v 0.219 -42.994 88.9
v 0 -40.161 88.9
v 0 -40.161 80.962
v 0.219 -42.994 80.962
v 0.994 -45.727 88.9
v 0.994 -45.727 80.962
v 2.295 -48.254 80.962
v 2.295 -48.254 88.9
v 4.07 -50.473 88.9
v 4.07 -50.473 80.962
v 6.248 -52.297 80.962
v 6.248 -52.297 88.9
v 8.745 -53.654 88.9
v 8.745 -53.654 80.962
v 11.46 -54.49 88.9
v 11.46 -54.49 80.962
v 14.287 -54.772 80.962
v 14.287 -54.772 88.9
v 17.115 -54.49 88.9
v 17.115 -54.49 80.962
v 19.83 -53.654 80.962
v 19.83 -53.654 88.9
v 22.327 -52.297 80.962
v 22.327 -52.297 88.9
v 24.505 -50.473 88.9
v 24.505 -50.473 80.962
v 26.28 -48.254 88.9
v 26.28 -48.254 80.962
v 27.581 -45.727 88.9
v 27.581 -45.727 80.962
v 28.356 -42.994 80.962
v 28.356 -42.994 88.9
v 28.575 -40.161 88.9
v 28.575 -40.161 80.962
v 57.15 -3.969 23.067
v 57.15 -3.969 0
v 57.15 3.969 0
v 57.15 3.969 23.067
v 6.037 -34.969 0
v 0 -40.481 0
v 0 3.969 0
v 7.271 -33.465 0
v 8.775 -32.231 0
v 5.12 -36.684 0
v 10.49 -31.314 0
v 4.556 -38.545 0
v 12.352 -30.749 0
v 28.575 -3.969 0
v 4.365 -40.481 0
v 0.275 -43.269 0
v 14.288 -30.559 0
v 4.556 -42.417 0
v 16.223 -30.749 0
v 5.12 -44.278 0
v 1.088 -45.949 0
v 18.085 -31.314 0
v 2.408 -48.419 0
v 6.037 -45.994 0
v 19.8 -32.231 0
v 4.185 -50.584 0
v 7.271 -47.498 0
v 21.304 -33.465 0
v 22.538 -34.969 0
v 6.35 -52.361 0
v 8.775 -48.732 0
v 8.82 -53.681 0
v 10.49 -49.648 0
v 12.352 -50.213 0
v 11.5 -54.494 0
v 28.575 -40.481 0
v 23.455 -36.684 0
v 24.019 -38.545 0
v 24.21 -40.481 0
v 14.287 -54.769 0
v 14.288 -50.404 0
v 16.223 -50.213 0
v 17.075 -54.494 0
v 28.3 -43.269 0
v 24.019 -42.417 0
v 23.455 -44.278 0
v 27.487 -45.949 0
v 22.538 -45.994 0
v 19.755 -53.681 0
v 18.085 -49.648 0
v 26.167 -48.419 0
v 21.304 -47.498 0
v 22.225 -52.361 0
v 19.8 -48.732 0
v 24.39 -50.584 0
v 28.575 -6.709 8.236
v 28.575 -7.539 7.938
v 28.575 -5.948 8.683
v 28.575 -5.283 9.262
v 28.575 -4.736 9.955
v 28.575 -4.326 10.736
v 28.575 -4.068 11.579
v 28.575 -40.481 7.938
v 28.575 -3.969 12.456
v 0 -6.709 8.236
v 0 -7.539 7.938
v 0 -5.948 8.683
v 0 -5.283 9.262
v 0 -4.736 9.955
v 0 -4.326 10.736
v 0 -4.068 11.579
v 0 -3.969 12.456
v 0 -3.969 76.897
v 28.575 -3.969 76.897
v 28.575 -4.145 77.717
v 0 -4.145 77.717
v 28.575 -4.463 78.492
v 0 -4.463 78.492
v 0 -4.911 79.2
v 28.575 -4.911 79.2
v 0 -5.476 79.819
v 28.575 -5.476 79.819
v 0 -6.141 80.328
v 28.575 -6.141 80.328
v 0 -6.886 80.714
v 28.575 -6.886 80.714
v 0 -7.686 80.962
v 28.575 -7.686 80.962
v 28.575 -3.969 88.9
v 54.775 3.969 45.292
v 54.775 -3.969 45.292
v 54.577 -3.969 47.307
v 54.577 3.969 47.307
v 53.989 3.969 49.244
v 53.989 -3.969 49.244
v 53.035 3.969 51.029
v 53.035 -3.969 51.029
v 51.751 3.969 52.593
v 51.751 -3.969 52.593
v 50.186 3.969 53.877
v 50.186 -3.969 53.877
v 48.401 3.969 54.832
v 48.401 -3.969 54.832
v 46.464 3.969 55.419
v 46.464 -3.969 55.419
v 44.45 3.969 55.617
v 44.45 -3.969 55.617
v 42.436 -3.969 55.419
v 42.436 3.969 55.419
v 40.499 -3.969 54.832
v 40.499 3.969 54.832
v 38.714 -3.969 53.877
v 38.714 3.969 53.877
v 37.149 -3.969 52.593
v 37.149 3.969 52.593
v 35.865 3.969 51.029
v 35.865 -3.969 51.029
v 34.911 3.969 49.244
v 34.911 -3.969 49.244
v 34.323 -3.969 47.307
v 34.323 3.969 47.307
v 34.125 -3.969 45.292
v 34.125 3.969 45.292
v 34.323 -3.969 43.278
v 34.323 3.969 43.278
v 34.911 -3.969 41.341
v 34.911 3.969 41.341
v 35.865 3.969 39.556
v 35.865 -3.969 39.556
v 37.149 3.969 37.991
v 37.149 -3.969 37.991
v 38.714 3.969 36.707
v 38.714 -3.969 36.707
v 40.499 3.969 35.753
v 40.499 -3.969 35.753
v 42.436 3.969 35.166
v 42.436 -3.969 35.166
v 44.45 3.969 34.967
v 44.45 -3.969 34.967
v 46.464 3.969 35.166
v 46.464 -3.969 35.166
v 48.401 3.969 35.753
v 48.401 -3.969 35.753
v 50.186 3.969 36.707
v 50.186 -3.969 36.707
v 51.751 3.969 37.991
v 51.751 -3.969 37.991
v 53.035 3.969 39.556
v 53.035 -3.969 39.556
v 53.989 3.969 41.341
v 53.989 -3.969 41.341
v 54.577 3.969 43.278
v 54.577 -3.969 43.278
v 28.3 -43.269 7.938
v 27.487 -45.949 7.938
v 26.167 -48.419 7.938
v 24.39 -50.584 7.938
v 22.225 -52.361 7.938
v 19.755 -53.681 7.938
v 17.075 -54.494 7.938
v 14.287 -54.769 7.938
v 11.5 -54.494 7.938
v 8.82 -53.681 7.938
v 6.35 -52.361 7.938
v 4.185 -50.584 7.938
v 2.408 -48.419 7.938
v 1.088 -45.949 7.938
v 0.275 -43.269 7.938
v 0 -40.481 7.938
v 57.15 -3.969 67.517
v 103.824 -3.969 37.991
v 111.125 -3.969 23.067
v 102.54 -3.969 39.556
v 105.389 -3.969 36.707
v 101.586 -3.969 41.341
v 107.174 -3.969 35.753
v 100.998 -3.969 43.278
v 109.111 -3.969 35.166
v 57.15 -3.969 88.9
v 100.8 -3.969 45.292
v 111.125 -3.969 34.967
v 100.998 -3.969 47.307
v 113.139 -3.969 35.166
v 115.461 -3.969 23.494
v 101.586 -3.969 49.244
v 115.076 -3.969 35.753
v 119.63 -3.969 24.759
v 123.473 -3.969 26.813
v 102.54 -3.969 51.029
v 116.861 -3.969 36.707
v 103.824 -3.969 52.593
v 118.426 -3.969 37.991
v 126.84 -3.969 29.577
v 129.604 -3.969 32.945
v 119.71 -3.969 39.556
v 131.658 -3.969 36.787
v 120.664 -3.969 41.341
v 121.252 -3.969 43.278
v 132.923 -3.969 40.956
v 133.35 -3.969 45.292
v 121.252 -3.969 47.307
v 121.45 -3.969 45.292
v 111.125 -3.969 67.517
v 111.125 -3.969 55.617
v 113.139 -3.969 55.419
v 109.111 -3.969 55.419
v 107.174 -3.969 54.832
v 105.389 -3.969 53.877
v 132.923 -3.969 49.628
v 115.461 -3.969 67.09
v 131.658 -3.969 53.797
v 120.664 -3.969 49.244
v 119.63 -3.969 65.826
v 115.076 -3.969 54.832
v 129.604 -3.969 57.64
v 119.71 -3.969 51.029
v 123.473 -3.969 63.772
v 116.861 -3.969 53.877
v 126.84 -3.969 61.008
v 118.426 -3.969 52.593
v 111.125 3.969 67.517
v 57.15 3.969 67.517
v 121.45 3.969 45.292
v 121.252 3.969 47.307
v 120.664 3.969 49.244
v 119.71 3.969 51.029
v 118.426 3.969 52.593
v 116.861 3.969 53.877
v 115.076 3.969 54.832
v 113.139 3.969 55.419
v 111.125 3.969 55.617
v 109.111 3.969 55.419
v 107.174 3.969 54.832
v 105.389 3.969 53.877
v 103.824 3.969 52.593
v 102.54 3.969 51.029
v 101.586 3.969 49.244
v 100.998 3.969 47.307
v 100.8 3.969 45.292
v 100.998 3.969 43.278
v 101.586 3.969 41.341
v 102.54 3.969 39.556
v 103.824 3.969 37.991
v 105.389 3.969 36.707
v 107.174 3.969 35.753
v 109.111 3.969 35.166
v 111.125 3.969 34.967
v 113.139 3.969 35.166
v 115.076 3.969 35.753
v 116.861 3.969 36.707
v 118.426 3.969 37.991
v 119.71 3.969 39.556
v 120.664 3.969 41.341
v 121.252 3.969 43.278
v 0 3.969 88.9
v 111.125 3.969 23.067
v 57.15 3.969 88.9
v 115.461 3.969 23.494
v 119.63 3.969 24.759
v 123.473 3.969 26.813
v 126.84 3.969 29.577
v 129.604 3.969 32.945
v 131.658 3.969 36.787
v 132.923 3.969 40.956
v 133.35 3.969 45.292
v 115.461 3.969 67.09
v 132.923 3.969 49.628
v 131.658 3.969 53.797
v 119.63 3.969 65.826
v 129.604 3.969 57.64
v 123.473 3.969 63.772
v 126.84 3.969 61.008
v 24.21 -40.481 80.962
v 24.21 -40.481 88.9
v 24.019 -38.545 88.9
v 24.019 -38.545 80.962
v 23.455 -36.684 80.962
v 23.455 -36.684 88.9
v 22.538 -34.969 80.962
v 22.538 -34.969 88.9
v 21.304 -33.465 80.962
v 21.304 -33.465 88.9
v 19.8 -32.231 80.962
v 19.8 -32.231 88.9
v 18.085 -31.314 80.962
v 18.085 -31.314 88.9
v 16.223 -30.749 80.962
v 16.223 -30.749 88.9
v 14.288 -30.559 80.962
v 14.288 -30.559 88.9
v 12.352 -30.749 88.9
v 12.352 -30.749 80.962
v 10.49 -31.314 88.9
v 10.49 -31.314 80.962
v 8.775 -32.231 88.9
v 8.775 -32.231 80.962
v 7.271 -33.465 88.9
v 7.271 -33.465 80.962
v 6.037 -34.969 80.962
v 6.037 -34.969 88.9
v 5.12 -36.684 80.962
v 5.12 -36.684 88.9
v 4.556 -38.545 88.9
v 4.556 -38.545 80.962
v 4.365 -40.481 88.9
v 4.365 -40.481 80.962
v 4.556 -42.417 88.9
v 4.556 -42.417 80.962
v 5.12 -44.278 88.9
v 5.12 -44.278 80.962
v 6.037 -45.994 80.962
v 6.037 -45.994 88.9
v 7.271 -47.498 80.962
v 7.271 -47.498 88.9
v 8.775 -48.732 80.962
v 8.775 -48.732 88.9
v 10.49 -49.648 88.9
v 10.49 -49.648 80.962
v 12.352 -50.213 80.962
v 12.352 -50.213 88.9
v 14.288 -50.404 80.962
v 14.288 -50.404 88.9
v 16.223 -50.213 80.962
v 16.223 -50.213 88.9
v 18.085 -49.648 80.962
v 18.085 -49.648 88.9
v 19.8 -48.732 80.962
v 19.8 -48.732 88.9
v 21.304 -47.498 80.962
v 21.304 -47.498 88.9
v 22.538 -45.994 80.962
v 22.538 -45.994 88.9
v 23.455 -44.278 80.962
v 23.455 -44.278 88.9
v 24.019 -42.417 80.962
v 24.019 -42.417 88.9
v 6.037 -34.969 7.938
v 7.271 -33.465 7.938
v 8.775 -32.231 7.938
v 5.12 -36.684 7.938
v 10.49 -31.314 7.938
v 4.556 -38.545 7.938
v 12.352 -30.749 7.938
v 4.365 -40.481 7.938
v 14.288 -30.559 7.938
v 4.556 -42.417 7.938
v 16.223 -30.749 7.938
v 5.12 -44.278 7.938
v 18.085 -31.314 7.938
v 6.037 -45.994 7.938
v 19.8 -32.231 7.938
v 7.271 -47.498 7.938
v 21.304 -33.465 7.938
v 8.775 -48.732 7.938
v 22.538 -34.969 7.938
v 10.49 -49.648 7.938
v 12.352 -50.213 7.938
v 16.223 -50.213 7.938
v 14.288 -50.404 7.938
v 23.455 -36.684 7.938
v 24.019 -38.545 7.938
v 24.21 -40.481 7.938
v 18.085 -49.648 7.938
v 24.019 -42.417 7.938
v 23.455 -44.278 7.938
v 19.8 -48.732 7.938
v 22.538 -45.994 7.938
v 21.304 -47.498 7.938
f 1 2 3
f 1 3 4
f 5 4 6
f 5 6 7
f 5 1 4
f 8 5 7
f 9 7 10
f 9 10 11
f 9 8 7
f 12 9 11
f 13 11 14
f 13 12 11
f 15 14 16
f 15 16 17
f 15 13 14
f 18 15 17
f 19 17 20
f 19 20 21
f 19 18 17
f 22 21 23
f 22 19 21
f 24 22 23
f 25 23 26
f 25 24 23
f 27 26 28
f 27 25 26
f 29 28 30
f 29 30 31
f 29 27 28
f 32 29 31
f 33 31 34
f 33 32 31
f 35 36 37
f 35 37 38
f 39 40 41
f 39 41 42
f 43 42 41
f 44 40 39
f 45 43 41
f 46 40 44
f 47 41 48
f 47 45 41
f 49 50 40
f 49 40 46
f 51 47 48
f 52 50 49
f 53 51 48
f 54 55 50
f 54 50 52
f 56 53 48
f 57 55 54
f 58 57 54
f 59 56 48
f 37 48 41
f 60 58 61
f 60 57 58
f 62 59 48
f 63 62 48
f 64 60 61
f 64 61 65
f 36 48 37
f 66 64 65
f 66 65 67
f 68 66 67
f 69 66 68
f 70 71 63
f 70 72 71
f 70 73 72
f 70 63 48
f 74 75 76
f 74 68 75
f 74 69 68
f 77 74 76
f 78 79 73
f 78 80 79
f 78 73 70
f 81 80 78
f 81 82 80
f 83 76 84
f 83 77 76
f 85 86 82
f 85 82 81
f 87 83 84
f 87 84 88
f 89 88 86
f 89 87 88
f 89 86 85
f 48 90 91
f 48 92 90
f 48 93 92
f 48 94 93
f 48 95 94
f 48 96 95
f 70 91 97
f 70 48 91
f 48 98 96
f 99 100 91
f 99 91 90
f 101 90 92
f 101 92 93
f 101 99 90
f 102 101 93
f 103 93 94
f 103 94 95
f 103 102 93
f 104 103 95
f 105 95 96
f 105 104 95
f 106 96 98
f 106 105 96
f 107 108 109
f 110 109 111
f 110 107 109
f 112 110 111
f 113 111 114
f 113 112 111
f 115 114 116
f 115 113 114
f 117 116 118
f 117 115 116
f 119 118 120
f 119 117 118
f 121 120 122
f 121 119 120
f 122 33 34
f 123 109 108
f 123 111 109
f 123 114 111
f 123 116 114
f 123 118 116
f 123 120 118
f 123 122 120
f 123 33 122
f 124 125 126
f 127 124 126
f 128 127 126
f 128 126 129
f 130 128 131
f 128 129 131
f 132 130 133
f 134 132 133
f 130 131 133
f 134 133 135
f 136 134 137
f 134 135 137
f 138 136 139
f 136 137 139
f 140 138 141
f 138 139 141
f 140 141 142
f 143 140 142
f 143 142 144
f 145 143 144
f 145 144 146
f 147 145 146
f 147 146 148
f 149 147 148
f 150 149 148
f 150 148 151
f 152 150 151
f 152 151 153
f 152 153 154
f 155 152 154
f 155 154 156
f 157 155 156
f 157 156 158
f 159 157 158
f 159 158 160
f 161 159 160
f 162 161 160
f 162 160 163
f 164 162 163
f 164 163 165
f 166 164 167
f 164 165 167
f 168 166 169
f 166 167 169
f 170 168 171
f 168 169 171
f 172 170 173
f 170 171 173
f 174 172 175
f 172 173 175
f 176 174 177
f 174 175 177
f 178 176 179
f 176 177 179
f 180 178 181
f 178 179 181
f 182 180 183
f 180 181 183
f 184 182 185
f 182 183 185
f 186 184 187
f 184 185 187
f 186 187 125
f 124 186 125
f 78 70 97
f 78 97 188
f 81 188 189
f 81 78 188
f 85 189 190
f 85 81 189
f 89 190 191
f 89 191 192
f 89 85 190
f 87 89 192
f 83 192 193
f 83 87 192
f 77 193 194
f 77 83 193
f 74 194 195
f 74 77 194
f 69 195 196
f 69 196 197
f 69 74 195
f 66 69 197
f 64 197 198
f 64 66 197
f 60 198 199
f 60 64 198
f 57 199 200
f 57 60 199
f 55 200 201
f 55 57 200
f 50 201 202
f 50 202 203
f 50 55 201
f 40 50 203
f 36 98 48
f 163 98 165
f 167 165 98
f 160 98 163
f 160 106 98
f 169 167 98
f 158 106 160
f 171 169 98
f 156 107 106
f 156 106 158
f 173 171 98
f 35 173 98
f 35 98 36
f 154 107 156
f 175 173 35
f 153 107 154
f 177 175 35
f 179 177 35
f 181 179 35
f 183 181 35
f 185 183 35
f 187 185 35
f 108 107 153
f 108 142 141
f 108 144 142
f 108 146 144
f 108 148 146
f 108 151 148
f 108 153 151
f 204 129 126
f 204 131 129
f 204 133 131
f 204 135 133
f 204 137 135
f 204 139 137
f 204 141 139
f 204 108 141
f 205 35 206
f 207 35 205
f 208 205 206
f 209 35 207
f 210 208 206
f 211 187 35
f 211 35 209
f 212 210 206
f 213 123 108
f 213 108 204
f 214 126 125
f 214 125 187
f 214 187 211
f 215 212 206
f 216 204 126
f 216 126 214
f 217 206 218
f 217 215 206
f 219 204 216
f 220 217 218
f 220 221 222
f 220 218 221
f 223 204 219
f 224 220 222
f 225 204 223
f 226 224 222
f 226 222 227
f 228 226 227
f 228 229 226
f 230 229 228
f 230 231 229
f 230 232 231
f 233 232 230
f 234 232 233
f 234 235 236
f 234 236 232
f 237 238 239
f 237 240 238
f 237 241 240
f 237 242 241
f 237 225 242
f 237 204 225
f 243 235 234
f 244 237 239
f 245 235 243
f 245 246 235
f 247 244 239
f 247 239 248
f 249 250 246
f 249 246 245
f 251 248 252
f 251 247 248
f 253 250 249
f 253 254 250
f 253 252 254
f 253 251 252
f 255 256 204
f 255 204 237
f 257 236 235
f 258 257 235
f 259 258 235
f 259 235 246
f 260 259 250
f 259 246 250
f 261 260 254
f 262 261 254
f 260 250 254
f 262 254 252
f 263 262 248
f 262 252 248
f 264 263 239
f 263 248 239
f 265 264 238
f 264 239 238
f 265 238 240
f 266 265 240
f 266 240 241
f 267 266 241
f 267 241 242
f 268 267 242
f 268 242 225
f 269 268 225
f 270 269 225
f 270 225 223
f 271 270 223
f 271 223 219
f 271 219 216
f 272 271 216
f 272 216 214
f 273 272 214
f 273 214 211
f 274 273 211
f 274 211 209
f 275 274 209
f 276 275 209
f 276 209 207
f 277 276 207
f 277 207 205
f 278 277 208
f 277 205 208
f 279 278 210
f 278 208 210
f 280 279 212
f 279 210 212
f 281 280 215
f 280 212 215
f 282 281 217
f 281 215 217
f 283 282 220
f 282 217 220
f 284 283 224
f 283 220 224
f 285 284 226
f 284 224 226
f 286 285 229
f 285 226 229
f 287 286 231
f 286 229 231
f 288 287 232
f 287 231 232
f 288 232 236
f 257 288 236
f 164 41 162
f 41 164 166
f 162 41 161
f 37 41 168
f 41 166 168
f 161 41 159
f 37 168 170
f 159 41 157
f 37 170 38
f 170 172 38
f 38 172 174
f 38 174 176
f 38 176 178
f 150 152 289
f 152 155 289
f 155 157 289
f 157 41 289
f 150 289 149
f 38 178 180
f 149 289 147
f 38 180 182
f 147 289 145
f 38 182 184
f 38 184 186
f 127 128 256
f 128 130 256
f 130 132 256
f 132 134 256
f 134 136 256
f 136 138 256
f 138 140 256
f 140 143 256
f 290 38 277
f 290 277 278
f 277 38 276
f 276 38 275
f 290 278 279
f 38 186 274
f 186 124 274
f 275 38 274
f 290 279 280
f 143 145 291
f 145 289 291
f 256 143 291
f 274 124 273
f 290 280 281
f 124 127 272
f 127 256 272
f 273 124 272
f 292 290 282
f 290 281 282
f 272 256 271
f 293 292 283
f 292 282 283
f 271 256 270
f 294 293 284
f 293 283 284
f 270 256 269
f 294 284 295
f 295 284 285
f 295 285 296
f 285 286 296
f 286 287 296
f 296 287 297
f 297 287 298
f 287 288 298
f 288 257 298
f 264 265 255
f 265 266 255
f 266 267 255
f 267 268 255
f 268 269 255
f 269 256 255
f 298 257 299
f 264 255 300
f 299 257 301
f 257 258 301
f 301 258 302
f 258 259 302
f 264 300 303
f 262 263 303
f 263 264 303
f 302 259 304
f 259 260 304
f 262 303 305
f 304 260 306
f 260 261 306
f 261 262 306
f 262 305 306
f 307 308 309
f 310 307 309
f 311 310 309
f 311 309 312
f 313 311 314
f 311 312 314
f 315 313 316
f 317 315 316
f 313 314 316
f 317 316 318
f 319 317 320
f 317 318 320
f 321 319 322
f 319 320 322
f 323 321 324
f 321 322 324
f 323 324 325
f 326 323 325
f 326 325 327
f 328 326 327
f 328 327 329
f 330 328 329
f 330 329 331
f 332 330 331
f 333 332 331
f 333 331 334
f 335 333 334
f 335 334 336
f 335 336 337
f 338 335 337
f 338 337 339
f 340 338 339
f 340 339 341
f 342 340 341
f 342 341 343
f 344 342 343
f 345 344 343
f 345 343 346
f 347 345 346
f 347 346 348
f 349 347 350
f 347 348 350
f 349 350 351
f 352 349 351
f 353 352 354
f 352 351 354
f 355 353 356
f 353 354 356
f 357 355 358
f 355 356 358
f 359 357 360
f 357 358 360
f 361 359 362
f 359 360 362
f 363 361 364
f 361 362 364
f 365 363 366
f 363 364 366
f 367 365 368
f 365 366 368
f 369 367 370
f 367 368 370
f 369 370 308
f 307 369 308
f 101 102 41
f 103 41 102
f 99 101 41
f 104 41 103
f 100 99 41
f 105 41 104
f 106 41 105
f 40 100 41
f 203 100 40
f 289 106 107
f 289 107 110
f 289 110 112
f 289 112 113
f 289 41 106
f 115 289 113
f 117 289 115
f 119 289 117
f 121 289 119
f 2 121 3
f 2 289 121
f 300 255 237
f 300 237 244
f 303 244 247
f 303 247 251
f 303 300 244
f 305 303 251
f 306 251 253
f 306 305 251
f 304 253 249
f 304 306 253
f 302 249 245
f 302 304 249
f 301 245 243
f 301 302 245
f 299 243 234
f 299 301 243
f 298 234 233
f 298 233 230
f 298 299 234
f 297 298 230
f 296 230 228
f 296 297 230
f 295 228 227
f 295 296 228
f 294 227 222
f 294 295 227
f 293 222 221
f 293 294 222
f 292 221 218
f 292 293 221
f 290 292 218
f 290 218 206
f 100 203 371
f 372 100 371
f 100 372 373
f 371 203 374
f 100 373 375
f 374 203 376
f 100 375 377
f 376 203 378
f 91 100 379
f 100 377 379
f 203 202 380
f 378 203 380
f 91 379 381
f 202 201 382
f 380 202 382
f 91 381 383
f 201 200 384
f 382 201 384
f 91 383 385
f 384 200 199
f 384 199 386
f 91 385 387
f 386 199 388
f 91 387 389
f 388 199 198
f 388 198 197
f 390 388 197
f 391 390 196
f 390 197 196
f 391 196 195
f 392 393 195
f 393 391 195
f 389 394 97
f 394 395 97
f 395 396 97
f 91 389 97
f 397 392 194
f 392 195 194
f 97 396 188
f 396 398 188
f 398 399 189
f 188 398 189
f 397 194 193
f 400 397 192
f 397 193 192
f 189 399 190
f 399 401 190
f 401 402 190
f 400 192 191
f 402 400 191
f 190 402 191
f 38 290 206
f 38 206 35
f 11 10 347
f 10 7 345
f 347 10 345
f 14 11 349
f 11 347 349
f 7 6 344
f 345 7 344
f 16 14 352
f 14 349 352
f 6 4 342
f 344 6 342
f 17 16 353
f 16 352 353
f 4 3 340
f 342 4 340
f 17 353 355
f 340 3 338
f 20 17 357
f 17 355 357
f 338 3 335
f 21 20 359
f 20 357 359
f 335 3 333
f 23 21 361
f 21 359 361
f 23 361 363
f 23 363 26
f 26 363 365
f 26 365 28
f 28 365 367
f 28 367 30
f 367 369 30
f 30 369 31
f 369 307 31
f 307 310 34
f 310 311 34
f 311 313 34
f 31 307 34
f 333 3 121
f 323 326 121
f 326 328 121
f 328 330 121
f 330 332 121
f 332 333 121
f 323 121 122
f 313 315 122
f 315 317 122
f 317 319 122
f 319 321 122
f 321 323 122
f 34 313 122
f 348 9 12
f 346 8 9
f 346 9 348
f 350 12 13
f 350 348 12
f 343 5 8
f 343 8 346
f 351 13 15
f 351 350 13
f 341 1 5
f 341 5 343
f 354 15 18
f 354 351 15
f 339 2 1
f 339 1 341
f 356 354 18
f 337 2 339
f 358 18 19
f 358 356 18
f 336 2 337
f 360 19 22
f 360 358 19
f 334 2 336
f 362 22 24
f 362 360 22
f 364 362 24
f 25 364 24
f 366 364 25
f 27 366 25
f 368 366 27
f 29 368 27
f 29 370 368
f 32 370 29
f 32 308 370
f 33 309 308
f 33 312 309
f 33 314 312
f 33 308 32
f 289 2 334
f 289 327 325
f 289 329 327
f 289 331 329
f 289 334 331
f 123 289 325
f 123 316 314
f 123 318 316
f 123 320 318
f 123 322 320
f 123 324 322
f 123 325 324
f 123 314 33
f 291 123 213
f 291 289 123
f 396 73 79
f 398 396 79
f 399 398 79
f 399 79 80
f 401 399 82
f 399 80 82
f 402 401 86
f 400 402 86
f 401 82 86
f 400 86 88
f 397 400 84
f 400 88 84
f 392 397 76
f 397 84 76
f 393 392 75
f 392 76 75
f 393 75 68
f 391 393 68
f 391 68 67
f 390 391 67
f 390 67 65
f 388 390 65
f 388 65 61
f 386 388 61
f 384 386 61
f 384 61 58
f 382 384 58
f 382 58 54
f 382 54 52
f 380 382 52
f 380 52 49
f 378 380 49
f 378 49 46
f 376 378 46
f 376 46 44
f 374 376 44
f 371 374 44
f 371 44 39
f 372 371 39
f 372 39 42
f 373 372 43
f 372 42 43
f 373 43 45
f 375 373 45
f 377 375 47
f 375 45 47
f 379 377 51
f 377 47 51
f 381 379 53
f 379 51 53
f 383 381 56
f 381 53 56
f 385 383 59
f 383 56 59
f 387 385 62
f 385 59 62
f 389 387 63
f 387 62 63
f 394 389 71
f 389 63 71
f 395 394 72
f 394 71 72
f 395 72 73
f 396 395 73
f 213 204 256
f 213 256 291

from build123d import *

# Parameters (mm, degrees)
F0_W      = 57.15
F0_H      = 88.9
F1_DEPTH  = 3.96875
F3_DEPTH  = 7.9375
F5_DEPTH  = 7.9375
F7_DEPTH  = 28.575
F8_R      = 9.92251
F9_DEPTH  = 25.4
F10_R     = 9.92251
F11_DEPTH = 25.4
F13_DEPTH = 7.9375
F14_R     = 10.3251
F15_DEPTH = 25.4
F16_DEPTH = 25.4
F18_DEPTH = 7.9375


with BuildPart() as f1:
    # F0 (on Front) → F1 (new body, symmetric)
    with BuildSketch(Plane.XZ):
        with Locations((28.575, 44.45)):
            Rectangle(F0_W, F0_H)
    extrude(amount=F1_DEPTH, both=True)

    # F2 (on face) → F3 (join)
    with BuildSketch(Plane(origin=(0, 0, 0), x_dir=(1, 0, 0), z_dir=(0, 0, -1))):
        with BuildLine():
            Line((0, 40.48125), (0, -3.96875))
            Line((0, -3.96875), (28.575, -3.96875))
            Line((28.575, -3.96875), (28.575, 40.48125))
            ThreePointArc((28.575, 40.48125), (14.2875, 54.76875), (0, 40.48125))
        make_face()
    extrude(amount=-F3_DEPTH)

    # F4 (on face) → F5 (join)
    with BuildSketch(Plane.XY.offset(88.9)):
        with BuildLine():
            Line((28.575, -40.160799), (28.575, 3.96875))
            Line((28.575, 3.96875), (0, 3.96875))
            Line((0, 3.96875), (0, -40.160799))
            ThreePointArc((0, -40.160799), (14.2875, -54.772343), (28.575, -40.160799))
        make_face()
    extrude(amount=-F5_DEPTH)

    # F6 (on face) → F7 (join)
    with BuildSketch(Plane(origin=(0, 0, 0), x_dir=(0, -1, 0), z_dir=(-1, 0, 0))):
        with BuildLine():
            Line((7.685762, 80.9625), (9.703519, 80.9625))
            ThreePointArc((9.703519, 80.9625), (8.694641, 81.070586), (7.685762, 80.9625))
        make_face()
        with BuildLine():
            ThreePointArc((3.96875, 76.897462), (5.179953, 79.521865), (7.685762, 80.9625))
            Line((7.685762, 80.9625), (3.96875, 80.9625))
            Line((3.96875, 80.9625), (3.96875, 76.897462))
        make_face()
        with BuildLine():
            Line((9.921576, 7.9375), (7.539107, 7.9375))
            ThreePointArc((7.539107, 7.9375), (8.730341, 7.786113), (9.921576, 7.9375))
        make_face()
        with BuildLine():
            ThreePointArc((7.539107, 7.9375), (4.993725, 9.595801), (3.96875, 12.455584))
            Line((3.96875, 12.455584), (3.96875, 7.9375))
            Line((3.96875, 7.9375), (7.539107, 7.9375))
        make_face()
    extrude(amount=-F7_DEPTH)

    # F8 (on face) → F9 (cut)
    with BuildSketch(Plane(origin=(0, 0, 0), x_dir=(1, 0, 0), z_dir=(0, 0, -1))):
        with Locations((14.2875, 40.48125)):
            Circle(F8_R)
    extrude(amount=-F9_DEPTH, mode=Mode.SUBTRACT)

    # F10 (on face) → F11 (cut)
    with BuildSketch(Plane.XY.offset(88.9)):
        with Locations((14.2875, -40.48125)):
            Circle(F10_R)
    extrude(amount=-F11_DEPTH, mode=Mode.SUBTRACT)

    # F12 (on face) → F13 (join)
    with BuildSketch(Plane(origin=(0, 3.96875, 0), x_dir=(-1, 0, 0), z_dir=(0, 1, 0))):
        with BuildLine():
            Line((-57.15, 67.517356), (-111.125, 67.517356))
            ThreePointArc((-111.125, 67.517356), (-133.35, 45.292356), (-111.125, 23.067356))
            Line((-111.125, 23.067356), (-57.15, 23.067356))
            Line((-57.15, 23.067356), (-57.15, 67.517356))
        make_face()
    extrude(amount=-F13_DEPTH)

    # F14 (on face) → F15 (cut)
    with BuildSketch(Plane.XZ.offset(3.96875)):
        with Locations((111.125, 45.292356)):
            Circle(F14_R)
        with Locations((44.45, 45.292356)):
            Circle(F14_R)
    extrude(amount=-F15_DEPTH, mode=Mode.SUBTRACT)

    # F14 (on face) → F16 (cut)
    with BuildSketch(Plane.XZ.offset(3.96875)):
        with Locations((111.125, 45.292356)):
            Circle(F14_R)
        with Locations((44.45, 45.292356)):
            Circle(F14_R)
    extrude(amount=-F16_DEPTH, mode=Mode.SUBTRACT)

    # F17 (on face) → F18 (join)
    with BuildSketch(Plane.XZ.offset(3.96875)):
        with BuildLine():
            Line((57.15, 67.517356), (57.15, 78.208678))
            ThreePointArc((57.15, 78.208678), (47.687893, 76.672868), (50.528099, 67.517356))
            Line((50.528099, 67.517356), (57.15, 67.517356))
        make_face()
        with BuildLine():
            Line((57.15, 23.067356), (51.937071, 23.067356))
            ThreePointArc((51.937071, 23.067356), (48.281511, 14.470241), (57.15, 11.533678))
            Line((57.15, 11.533678), (57.15, 23.067356))
        make_face()
    extrude(amount=-F18_DEPTH)


solid = f1.part
